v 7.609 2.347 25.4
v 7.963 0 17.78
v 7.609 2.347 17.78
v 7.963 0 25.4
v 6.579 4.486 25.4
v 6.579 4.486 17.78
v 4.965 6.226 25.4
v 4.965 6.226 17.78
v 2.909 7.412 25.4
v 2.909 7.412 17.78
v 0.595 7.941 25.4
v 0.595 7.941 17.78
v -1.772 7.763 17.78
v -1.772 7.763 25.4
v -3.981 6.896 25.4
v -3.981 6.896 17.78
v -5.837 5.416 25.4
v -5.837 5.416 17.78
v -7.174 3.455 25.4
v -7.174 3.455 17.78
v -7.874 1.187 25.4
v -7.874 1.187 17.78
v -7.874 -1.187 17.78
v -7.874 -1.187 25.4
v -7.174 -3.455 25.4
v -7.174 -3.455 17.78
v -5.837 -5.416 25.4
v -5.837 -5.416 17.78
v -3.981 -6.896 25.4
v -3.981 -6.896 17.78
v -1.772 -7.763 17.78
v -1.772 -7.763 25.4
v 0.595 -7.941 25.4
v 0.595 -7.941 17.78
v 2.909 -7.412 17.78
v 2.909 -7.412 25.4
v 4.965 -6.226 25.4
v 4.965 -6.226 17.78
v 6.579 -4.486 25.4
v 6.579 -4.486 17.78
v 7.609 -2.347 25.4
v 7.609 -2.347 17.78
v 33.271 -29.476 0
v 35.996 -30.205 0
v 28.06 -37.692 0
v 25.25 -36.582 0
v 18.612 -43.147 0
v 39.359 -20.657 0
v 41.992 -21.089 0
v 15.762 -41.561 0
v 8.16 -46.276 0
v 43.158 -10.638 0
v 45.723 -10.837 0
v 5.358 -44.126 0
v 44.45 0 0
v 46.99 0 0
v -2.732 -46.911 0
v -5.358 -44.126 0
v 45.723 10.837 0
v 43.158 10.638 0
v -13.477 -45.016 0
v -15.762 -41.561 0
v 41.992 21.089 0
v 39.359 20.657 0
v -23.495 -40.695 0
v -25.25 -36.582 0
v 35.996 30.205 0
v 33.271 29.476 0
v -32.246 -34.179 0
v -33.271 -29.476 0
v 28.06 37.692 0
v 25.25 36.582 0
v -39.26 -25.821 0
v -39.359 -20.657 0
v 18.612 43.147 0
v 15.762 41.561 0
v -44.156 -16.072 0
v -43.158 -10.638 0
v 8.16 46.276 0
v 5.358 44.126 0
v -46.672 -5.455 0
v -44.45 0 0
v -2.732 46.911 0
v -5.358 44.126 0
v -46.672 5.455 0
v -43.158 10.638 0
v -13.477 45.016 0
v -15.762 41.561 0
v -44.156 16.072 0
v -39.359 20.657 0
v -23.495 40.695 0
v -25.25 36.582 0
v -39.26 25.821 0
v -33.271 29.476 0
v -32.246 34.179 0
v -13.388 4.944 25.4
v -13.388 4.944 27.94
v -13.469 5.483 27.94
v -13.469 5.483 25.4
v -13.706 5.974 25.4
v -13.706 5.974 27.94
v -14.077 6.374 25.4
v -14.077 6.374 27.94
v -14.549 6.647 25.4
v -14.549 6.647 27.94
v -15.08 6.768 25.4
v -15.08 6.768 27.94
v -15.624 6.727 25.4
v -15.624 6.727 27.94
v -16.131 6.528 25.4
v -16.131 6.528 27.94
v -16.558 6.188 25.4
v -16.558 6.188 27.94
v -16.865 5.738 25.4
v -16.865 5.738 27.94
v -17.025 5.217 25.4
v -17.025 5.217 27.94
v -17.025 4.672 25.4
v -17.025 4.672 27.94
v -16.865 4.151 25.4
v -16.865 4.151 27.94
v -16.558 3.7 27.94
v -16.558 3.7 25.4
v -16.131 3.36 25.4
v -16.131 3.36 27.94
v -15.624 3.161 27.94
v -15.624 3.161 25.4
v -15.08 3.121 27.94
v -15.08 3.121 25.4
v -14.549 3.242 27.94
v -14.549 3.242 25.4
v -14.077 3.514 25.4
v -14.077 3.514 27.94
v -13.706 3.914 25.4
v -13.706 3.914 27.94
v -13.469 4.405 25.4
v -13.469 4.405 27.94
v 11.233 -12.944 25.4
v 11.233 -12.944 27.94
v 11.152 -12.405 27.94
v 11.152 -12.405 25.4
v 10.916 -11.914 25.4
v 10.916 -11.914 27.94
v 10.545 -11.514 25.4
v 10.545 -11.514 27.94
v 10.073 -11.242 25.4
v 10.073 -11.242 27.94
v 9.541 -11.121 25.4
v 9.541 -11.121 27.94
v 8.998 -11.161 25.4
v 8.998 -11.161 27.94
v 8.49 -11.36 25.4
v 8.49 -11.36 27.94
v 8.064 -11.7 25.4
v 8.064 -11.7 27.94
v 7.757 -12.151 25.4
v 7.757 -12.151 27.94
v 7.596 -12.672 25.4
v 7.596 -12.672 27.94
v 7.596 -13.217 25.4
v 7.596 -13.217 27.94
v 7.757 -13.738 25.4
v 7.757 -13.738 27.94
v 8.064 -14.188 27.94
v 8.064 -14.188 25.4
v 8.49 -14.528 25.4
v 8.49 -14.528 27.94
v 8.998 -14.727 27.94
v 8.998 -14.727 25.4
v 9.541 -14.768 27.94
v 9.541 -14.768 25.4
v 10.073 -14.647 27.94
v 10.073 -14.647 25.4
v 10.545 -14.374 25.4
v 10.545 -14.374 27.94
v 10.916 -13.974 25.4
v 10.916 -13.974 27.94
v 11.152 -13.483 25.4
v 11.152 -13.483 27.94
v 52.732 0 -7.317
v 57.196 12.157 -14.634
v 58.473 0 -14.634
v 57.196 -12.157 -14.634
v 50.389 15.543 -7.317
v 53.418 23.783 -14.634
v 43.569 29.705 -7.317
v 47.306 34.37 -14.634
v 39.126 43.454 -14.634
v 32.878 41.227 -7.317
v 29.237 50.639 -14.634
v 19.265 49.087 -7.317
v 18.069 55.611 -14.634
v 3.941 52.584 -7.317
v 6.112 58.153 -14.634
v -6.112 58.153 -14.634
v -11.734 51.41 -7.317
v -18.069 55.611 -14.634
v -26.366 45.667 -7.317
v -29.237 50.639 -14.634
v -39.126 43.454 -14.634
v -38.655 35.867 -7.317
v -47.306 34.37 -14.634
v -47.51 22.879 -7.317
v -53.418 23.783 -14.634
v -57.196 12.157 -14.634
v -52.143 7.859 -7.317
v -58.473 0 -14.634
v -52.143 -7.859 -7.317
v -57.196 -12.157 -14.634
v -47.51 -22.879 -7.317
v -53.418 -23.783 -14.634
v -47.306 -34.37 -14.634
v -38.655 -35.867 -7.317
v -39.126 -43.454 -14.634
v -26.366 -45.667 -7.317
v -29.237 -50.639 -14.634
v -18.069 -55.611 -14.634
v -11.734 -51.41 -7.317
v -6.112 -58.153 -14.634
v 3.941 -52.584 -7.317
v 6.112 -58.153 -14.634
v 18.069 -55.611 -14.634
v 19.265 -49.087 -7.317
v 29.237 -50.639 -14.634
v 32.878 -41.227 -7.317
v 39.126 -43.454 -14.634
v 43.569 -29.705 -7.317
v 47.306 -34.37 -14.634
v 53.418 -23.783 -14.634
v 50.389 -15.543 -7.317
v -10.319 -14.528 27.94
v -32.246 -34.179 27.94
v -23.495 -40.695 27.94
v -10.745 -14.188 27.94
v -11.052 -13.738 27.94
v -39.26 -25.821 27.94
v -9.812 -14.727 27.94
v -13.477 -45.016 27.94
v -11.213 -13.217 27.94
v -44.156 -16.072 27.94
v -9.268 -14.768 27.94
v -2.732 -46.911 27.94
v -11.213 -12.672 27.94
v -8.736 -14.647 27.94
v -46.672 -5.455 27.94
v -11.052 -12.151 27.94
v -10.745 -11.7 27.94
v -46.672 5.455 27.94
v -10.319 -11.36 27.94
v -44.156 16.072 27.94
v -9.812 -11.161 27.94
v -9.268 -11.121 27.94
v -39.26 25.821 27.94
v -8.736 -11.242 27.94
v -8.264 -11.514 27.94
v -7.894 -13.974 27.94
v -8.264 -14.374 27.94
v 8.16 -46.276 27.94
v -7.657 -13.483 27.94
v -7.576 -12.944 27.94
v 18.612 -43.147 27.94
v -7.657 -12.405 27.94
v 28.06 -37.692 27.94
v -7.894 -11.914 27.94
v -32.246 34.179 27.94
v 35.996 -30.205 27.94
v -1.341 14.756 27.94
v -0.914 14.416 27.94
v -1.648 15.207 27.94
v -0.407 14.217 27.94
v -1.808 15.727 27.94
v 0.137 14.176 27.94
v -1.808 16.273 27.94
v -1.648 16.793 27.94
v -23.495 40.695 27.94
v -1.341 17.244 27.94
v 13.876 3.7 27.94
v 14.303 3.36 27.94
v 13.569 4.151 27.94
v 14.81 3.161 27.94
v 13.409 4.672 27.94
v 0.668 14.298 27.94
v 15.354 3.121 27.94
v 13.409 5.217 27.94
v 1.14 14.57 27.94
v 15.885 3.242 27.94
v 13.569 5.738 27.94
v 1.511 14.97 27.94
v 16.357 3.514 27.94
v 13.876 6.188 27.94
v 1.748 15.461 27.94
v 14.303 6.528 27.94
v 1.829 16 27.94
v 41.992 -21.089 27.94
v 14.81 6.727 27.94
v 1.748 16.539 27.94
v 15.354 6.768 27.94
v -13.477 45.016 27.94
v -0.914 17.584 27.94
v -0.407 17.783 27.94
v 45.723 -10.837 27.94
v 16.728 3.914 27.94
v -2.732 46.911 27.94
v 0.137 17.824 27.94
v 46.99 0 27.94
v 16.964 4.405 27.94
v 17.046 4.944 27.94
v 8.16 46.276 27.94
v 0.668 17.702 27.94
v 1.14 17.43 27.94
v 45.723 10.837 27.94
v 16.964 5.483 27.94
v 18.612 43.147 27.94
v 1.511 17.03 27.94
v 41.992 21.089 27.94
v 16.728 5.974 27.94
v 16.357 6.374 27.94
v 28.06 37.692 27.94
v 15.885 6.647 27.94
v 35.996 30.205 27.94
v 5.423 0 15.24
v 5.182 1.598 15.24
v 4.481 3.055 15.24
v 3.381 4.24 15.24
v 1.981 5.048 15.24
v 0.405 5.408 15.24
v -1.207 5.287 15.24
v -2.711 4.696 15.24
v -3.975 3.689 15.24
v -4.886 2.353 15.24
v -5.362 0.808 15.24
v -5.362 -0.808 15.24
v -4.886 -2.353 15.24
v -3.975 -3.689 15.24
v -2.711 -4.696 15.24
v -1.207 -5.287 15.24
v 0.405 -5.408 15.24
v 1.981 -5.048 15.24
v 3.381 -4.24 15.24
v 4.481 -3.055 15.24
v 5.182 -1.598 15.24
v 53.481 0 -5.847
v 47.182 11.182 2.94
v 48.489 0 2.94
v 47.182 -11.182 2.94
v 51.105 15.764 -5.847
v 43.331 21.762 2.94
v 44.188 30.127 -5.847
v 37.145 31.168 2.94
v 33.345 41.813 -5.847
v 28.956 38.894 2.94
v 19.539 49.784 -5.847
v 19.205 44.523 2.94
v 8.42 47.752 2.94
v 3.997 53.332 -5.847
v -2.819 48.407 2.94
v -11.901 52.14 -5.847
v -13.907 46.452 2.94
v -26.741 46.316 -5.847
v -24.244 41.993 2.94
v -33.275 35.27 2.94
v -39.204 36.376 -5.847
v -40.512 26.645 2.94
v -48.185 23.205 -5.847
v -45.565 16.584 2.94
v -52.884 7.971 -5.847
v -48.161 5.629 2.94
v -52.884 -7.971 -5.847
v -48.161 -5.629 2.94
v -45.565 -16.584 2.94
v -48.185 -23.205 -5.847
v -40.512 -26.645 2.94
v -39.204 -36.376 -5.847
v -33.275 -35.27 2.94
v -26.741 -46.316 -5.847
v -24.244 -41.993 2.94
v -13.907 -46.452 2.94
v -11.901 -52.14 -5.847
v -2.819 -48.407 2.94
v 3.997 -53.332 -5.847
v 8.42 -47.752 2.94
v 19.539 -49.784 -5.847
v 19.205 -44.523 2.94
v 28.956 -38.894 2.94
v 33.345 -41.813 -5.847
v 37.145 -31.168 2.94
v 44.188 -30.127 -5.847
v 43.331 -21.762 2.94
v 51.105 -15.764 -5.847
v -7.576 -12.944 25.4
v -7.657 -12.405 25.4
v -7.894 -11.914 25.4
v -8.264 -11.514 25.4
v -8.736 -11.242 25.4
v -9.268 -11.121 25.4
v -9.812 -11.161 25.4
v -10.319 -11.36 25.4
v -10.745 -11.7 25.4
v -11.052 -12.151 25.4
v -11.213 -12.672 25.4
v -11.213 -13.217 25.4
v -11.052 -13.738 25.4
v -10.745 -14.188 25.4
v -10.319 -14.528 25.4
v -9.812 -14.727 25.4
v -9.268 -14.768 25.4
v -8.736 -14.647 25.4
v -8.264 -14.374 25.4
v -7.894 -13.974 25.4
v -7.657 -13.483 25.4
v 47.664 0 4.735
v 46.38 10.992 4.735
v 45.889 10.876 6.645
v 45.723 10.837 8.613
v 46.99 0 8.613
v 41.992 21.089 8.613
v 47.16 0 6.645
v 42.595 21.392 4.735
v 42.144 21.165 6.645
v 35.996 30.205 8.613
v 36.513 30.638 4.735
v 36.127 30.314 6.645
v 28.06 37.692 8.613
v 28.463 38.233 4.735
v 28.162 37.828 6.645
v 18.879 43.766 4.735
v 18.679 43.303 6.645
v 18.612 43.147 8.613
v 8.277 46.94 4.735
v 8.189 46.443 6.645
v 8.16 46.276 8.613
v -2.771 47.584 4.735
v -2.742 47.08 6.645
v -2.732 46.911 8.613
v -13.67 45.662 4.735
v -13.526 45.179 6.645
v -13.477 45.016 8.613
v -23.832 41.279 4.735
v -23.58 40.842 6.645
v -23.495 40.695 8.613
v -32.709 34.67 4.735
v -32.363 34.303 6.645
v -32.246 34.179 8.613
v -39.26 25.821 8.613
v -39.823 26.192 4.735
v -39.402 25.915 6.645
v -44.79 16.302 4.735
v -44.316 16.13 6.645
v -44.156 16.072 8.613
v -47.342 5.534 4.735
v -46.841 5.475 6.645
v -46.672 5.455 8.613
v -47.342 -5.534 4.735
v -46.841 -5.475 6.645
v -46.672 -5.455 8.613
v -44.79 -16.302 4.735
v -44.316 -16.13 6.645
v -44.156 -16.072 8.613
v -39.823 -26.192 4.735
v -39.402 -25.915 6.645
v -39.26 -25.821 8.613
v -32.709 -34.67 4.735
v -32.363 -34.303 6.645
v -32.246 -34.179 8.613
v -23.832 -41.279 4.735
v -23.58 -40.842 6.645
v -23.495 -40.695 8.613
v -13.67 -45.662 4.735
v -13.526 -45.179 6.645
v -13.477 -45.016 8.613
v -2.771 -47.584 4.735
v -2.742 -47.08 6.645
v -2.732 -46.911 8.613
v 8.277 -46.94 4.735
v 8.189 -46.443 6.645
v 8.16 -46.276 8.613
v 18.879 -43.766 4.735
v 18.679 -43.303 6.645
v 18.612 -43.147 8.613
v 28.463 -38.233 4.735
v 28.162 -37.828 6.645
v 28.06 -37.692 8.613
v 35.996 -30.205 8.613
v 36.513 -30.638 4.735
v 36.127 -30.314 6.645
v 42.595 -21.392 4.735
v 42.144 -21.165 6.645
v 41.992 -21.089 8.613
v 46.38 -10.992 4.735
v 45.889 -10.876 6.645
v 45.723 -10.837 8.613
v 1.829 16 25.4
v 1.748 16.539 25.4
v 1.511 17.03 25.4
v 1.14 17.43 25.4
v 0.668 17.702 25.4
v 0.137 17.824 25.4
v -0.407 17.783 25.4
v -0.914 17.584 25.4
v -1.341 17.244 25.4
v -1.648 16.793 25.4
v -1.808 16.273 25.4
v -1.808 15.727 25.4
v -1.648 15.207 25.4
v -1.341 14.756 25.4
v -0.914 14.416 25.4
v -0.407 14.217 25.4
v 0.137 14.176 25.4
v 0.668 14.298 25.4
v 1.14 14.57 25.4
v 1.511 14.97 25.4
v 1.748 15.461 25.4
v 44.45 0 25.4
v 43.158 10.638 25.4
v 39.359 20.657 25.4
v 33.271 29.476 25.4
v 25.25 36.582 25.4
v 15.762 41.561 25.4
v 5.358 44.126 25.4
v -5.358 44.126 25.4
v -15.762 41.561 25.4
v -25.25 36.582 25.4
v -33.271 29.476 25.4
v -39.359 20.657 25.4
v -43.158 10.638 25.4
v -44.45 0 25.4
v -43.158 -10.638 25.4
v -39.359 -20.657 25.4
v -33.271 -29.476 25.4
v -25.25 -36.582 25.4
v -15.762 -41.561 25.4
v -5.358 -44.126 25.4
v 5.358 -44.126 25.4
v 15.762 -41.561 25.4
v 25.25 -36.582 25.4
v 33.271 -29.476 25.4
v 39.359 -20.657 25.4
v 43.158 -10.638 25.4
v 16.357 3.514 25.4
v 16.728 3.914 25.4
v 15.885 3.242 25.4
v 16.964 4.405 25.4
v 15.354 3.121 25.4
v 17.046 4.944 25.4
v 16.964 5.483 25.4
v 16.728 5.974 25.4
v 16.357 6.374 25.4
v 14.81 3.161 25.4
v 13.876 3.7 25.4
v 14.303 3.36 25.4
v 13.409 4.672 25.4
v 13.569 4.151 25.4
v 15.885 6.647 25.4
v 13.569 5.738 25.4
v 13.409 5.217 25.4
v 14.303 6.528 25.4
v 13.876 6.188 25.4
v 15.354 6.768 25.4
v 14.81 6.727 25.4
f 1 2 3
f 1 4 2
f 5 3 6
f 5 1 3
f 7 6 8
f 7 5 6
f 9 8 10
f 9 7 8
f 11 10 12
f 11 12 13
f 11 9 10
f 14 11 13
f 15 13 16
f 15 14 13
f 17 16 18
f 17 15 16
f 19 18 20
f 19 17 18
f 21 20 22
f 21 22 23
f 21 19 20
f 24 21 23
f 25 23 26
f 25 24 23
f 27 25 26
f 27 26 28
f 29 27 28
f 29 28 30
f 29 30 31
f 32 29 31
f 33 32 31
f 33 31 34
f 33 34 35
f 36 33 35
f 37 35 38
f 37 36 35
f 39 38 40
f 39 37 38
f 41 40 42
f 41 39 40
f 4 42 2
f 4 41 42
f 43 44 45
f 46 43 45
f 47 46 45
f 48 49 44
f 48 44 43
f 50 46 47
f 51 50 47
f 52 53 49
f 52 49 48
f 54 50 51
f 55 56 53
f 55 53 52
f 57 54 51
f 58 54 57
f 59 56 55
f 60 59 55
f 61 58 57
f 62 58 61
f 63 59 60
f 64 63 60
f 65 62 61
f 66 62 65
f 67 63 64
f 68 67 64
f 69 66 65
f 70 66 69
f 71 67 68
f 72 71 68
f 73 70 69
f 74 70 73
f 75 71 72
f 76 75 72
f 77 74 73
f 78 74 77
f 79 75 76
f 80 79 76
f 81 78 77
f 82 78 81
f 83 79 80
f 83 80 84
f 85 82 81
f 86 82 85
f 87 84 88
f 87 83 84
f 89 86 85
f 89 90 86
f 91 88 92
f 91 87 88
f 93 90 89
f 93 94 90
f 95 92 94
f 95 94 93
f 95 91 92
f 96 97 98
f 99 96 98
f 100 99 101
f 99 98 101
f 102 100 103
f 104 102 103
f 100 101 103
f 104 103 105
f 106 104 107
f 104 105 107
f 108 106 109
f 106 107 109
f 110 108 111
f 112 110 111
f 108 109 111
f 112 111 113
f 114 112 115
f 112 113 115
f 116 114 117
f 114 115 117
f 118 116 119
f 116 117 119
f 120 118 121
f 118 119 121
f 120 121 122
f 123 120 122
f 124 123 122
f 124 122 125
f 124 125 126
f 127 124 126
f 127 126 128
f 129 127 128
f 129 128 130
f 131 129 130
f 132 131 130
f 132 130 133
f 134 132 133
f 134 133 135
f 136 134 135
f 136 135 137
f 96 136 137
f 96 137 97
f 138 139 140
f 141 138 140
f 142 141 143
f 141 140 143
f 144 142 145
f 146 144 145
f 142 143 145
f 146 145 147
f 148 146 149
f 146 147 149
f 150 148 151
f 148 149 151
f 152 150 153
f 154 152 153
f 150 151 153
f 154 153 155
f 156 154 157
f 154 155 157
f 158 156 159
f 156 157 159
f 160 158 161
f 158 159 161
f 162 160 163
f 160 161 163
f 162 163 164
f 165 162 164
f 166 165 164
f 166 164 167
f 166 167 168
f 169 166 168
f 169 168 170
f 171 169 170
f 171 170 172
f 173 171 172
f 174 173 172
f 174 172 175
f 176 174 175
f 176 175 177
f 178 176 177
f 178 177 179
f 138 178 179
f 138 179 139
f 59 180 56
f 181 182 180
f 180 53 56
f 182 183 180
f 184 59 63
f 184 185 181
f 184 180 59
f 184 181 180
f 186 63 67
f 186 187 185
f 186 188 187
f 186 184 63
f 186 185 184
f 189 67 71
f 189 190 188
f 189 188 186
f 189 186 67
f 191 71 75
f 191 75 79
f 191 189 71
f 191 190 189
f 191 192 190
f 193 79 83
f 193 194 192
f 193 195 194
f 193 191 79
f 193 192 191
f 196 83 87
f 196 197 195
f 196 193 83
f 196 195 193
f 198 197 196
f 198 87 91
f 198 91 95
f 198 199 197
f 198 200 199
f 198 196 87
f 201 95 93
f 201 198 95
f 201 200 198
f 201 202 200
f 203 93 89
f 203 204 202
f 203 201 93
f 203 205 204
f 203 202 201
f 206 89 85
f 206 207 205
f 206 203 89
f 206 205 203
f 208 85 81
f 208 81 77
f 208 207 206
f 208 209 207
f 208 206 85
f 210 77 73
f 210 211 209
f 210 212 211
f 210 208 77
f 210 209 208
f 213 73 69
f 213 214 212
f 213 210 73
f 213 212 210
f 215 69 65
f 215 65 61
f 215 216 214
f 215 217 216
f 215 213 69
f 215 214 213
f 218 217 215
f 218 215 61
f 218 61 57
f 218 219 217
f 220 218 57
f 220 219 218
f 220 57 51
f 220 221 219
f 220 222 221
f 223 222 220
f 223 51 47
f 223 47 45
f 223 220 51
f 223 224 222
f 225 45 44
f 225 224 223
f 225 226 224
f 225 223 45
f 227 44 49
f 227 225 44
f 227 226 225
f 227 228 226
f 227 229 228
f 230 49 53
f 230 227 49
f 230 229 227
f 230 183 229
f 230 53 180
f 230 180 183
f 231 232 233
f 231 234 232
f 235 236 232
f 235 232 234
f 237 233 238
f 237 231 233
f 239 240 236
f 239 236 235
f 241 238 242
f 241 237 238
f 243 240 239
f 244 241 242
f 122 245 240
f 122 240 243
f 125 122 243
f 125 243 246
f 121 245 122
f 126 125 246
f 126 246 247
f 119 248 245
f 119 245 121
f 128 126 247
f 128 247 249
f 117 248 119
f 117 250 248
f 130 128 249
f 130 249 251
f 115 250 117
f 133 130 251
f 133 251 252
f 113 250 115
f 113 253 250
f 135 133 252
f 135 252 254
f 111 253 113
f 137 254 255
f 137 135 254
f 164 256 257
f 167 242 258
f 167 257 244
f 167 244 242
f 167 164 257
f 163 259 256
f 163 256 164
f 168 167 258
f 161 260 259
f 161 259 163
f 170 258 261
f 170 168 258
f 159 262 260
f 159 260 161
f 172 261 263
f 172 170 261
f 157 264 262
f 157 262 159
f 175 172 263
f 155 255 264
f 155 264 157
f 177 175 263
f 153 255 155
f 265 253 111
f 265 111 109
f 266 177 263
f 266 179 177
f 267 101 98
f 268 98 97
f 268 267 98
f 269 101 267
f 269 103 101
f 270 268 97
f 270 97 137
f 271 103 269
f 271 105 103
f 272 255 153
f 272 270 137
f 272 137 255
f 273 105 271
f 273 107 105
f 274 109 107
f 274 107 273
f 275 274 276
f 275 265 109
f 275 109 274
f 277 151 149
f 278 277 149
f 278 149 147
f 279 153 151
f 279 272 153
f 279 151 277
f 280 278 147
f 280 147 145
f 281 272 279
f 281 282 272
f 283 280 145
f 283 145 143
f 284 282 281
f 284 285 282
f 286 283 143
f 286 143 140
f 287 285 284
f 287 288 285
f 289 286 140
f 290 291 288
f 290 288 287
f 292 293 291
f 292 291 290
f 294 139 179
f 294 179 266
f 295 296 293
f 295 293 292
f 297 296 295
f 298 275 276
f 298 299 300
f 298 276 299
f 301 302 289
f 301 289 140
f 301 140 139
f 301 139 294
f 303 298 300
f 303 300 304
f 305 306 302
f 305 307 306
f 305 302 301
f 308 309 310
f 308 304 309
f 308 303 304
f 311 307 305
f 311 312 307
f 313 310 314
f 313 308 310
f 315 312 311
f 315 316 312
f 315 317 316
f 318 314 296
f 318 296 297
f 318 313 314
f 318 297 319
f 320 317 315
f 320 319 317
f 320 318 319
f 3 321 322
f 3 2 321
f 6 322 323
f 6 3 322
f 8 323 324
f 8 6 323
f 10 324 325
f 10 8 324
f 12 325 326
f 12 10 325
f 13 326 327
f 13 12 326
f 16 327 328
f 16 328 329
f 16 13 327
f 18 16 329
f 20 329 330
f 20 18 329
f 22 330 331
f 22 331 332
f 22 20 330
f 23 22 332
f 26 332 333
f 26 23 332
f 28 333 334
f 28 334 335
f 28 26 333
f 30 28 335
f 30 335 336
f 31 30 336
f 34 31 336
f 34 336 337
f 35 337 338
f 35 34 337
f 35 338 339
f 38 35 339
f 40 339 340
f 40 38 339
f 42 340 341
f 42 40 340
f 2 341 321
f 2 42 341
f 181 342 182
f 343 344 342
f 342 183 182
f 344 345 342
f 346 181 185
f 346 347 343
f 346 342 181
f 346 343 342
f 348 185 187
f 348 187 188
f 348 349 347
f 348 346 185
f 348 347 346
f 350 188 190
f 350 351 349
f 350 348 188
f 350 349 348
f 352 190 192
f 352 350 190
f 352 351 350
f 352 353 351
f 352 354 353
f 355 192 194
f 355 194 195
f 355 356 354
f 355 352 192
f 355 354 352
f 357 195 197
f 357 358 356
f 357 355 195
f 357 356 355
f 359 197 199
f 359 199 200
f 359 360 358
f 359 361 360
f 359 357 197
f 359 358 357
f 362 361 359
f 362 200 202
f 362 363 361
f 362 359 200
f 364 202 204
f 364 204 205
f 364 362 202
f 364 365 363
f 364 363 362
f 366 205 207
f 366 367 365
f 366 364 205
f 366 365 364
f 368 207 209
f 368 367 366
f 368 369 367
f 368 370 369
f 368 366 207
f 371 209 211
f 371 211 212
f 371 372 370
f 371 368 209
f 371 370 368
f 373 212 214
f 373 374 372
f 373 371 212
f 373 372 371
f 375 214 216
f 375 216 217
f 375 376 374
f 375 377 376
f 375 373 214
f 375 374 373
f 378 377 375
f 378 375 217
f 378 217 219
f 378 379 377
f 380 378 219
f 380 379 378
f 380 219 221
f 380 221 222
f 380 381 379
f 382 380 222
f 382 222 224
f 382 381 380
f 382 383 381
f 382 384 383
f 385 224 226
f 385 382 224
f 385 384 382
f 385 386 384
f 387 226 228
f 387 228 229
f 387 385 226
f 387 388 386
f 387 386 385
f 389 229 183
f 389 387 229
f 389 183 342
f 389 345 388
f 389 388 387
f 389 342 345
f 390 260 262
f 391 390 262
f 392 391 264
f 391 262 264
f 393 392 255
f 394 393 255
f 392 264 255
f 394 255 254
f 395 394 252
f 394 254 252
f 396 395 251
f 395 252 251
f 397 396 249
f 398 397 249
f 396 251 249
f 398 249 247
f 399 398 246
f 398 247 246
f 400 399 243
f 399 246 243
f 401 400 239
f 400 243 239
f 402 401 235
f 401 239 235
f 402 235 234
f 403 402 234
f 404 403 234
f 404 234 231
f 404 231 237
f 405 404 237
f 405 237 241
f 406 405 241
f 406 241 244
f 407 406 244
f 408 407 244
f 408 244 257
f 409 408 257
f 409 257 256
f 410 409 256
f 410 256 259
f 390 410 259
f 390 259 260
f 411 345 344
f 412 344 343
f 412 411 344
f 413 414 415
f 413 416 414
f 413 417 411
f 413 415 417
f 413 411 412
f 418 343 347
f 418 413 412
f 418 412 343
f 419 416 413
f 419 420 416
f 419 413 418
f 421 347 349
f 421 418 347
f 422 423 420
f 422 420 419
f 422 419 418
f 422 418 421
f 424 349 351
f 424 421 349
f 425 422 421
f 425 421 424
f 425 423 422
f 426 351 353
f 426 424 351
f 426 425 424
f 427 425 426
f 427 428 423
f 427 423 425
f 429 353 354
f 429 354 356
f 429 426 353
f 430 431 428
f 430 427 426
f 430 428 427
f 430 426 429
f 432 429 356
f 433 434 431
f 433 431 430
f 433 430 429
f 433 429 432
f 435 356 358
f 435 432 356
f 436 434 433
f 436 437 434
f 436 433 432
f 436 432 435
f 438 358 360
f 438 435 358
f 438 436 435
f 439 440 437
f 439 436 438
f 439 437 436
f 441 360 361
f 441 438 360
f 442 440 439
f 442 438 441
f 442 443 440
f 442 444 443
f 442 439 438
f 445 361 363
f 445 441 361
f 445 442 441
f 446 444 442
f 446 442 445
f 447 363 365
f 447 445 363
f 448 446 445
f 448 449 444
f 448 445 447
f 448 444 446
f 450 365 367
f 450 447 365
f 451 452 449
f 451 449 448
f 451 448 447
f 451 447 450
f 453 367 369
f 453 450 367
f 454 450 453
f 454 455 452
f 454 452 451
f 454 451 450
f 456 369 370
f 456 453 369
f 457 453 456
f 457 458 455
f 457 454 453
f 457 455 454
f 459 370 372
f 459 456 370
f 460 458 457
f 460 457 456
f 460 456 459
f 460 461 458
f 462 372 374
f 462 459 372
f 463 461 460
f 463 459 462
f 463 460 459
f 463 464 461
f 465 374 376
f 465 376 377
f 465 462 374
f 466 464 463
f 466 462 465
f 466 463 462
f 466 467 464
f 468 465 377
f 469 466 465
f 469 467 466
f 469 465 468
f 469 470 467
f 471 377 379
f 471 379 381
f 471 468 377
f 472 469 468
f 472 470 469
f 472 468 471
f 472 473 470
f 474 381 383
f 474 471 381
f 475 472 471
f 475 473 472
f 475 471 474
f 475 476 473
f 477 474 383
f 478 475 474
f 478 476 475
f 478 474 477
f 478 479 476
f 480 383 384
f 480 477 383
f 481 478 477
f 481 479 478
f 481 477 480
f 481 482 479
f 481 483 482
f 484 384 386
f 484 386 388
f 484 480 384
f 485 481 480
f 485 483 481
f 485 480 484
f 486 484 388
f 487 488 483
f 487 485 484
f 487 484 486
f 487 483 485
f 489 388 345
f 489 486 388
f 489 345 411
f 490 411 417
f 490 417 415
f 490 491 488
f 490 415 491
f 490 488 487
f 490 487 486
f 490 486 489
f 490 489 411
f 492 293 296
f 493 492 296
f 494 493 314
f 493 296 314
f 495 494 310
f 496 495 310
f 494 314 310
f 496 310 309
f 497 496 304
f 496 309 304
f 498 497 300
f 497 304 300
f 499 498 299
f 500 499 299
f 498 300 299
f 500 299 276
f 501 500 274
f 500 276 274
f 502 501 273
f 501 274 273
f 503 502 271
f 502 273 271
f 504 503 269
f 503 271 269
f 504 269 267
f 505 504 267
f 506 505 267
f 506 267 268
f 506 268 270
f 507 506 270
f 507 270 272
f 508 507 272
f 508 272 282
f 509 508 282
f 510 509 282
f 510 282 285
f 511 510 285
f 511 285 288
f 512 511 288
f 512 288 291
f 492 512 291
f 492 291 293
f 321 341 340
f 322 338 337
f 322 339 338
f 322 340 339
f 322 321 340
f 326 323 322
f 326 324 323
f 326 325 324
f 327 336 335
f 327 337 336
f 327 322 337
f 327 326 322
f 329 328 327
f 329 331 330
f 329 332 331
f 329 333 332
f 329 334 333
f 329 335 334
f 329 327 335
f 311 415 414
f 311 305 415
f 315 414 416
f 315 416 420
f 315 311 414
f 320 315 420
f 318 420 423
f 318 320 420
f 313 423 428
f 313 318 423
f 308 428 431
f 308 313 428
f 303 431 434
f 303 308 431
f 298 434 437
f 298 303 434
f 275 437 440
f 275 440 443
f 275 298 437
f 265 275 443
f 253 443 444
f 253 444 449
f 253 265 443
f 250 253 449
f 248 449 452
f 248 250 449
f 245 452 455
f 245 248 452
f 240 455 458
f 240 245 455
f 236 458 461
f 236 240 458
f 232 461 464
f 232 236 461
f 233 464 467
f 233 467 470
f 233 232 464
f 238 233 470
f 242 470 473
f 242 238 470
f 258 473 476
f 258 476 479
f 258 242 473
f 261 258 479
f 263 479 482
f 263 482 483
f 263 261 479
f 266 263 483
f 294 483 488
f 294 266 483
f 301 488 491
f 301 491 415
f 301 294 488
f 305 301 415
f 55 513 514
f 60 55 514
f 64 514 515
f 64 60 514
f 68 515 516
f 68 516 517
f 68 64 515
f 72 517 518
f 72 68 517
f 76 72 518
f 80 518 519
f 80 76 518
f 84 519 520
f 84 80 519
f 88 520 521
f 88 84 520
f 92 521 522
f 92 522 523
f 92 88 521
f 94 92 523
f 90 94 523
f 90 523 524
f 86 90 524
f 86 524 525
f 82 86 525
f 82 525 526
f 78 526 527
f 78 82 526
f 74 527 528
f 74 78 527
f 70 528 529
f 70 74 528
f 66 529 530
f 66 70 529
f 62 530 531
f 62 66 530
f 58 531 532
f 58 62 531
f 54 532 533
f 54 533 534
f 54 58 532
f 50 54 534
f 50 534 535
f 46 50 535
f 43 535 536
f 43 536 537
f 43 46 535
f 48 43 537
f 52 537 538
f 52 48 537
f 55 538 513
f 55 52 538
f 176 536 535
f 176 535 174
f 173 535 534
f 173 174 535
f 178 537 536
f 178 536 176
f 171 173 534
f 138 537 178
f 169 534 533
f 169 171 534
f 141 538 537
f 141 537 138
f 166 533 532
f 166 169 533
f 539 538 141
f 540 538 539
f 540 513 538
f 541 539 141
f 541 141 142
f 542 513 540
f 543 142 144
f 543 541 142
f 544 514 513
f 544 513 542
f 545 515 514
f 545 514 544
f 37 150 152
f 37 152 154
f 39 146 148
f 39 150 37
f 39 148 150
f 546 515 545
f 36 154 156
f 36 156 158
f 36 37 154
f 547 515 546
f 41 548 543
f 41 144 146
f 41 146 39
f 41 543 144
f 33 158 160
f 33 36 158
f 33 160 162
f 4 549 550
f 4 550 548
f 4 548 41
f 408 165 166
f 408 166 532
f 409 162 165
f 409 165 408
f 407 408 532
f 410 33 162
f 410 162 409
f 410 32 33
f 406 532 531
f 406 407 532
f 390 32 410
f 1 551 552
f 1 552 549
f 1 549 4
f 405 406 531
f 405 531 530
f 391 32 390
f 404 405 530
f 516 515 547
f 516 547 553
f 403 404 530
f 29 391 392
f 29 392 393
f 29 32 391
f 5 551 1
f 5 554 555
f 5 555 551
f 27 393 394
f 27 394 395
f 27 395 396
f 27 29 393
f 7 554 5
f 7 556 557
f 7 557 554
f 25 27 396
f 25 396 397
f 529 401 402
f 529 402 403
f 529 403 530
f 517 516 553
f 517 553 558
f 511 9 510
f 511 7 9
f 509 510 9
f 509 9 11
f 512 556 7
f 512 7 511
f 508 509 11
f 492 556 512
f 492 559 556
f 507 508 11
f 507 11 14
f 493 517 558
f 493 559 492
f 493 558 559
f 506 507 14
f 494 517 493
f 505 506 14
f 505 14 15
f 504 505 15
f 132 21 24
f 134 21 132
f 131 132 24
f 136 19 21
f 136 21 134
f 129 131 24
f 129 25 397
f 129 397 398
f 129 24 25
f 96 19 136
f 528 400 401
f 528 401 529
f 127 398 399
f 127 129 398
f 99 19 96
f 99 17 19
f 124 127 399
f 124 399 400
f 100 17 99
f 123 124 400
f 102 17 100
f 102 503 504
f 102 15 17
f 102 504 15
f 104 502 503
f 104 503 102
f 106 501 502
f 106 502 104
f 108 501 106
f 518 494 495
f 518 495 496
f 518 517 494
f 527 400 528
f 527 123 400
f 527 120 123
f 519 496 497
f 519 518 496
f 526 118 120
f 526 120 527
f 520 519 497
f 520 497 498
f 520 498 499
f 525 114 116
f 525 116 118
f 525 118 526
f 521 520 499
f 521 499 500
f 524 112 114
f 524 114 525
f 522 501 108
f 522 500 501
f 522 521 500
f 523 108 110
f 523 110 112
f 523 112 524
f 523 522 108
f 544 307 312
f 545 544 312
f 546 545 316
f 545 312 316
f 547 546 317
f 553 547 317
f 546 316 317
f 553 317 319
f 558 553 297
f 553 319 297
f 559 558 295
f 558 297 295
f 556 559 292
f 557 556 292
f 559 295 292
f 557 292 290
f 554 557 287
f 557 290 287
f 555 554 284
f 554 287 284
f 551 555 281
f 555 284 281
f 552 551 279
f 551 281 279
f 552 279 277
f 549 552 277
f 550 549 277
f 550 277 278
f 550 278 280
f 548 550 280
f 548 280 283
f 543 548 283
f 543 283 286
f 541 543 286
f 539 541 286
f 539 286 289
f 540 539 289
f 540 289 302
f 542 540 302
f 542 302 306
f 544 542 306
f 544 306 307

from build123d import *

# Parameters (mm, degrees)
SKETCH2_R          = 1.8288
CUT_EXTRUDE1_DEPTH = 43.573973945


with BuildPart() as part:
    # Sketch1 → Revolve1 (revolve)
    with BuildSketch(Plane(origin=(0, 0, 0), x_dir=(1, 0, 0), z_dir=(0, 1, 0))):
        with BuildLine():
            Line((7.9629, -25.4), (44.45, -25.4))
            Line((44.45, -25.4), (44.45, 0))
            Line((44.45, 0), (46.99, 0))
            Line((46.99, 0), (58.473357526, 14.633973945))
            Line((58.473357526, 14.633973945), (48.488896002, -2.93998396))
            ThreePointArc((48.488896002, -2.93998396), (47.371046022, -5.678922959), (46.99, -8.612551998))
            Line((46.99, -8.612551998), (46.99, -27.94))
            Line((46.99, -27.94), (0, -27.94))
            Line((0, -27.94), (0, -15.24))
            Line((0, -15.24), (5.4229, -15.24))
            Line((5.4229, -15.24), (7.9629, -17.78))
            Line((7.9629, -17.78), (7.9629, -25.4))
        make_face()
    revolve(axis=Axis((0, 0, 0), (0, 0, 1)))

    # Sketch2 → Cut-Extrude1 (cut, through all)
    with BuildSketch(Plane.XY.offset(27.94)):
        with Locations((0, 16)):
            Circle(SKETCH2_R)
        with Locations((15.216904261, 4.94427191)):
            Circle(SKETCH2_R)
        with Locations((9.404564037, -12.94427191)):
            Circle(SKETCH2_R)
        with Locations((-9.404564037, -12.94427191)):
            Circle(SKETCH2_R)
        with Locations((-15.216904261, 4.94427191)):
            Circle(SKETCH2_R)
    extrude(amount=-CUT_EXTRUDE1_DEPTH, mode=Mode.SUBTRACT)


solid = part.part
